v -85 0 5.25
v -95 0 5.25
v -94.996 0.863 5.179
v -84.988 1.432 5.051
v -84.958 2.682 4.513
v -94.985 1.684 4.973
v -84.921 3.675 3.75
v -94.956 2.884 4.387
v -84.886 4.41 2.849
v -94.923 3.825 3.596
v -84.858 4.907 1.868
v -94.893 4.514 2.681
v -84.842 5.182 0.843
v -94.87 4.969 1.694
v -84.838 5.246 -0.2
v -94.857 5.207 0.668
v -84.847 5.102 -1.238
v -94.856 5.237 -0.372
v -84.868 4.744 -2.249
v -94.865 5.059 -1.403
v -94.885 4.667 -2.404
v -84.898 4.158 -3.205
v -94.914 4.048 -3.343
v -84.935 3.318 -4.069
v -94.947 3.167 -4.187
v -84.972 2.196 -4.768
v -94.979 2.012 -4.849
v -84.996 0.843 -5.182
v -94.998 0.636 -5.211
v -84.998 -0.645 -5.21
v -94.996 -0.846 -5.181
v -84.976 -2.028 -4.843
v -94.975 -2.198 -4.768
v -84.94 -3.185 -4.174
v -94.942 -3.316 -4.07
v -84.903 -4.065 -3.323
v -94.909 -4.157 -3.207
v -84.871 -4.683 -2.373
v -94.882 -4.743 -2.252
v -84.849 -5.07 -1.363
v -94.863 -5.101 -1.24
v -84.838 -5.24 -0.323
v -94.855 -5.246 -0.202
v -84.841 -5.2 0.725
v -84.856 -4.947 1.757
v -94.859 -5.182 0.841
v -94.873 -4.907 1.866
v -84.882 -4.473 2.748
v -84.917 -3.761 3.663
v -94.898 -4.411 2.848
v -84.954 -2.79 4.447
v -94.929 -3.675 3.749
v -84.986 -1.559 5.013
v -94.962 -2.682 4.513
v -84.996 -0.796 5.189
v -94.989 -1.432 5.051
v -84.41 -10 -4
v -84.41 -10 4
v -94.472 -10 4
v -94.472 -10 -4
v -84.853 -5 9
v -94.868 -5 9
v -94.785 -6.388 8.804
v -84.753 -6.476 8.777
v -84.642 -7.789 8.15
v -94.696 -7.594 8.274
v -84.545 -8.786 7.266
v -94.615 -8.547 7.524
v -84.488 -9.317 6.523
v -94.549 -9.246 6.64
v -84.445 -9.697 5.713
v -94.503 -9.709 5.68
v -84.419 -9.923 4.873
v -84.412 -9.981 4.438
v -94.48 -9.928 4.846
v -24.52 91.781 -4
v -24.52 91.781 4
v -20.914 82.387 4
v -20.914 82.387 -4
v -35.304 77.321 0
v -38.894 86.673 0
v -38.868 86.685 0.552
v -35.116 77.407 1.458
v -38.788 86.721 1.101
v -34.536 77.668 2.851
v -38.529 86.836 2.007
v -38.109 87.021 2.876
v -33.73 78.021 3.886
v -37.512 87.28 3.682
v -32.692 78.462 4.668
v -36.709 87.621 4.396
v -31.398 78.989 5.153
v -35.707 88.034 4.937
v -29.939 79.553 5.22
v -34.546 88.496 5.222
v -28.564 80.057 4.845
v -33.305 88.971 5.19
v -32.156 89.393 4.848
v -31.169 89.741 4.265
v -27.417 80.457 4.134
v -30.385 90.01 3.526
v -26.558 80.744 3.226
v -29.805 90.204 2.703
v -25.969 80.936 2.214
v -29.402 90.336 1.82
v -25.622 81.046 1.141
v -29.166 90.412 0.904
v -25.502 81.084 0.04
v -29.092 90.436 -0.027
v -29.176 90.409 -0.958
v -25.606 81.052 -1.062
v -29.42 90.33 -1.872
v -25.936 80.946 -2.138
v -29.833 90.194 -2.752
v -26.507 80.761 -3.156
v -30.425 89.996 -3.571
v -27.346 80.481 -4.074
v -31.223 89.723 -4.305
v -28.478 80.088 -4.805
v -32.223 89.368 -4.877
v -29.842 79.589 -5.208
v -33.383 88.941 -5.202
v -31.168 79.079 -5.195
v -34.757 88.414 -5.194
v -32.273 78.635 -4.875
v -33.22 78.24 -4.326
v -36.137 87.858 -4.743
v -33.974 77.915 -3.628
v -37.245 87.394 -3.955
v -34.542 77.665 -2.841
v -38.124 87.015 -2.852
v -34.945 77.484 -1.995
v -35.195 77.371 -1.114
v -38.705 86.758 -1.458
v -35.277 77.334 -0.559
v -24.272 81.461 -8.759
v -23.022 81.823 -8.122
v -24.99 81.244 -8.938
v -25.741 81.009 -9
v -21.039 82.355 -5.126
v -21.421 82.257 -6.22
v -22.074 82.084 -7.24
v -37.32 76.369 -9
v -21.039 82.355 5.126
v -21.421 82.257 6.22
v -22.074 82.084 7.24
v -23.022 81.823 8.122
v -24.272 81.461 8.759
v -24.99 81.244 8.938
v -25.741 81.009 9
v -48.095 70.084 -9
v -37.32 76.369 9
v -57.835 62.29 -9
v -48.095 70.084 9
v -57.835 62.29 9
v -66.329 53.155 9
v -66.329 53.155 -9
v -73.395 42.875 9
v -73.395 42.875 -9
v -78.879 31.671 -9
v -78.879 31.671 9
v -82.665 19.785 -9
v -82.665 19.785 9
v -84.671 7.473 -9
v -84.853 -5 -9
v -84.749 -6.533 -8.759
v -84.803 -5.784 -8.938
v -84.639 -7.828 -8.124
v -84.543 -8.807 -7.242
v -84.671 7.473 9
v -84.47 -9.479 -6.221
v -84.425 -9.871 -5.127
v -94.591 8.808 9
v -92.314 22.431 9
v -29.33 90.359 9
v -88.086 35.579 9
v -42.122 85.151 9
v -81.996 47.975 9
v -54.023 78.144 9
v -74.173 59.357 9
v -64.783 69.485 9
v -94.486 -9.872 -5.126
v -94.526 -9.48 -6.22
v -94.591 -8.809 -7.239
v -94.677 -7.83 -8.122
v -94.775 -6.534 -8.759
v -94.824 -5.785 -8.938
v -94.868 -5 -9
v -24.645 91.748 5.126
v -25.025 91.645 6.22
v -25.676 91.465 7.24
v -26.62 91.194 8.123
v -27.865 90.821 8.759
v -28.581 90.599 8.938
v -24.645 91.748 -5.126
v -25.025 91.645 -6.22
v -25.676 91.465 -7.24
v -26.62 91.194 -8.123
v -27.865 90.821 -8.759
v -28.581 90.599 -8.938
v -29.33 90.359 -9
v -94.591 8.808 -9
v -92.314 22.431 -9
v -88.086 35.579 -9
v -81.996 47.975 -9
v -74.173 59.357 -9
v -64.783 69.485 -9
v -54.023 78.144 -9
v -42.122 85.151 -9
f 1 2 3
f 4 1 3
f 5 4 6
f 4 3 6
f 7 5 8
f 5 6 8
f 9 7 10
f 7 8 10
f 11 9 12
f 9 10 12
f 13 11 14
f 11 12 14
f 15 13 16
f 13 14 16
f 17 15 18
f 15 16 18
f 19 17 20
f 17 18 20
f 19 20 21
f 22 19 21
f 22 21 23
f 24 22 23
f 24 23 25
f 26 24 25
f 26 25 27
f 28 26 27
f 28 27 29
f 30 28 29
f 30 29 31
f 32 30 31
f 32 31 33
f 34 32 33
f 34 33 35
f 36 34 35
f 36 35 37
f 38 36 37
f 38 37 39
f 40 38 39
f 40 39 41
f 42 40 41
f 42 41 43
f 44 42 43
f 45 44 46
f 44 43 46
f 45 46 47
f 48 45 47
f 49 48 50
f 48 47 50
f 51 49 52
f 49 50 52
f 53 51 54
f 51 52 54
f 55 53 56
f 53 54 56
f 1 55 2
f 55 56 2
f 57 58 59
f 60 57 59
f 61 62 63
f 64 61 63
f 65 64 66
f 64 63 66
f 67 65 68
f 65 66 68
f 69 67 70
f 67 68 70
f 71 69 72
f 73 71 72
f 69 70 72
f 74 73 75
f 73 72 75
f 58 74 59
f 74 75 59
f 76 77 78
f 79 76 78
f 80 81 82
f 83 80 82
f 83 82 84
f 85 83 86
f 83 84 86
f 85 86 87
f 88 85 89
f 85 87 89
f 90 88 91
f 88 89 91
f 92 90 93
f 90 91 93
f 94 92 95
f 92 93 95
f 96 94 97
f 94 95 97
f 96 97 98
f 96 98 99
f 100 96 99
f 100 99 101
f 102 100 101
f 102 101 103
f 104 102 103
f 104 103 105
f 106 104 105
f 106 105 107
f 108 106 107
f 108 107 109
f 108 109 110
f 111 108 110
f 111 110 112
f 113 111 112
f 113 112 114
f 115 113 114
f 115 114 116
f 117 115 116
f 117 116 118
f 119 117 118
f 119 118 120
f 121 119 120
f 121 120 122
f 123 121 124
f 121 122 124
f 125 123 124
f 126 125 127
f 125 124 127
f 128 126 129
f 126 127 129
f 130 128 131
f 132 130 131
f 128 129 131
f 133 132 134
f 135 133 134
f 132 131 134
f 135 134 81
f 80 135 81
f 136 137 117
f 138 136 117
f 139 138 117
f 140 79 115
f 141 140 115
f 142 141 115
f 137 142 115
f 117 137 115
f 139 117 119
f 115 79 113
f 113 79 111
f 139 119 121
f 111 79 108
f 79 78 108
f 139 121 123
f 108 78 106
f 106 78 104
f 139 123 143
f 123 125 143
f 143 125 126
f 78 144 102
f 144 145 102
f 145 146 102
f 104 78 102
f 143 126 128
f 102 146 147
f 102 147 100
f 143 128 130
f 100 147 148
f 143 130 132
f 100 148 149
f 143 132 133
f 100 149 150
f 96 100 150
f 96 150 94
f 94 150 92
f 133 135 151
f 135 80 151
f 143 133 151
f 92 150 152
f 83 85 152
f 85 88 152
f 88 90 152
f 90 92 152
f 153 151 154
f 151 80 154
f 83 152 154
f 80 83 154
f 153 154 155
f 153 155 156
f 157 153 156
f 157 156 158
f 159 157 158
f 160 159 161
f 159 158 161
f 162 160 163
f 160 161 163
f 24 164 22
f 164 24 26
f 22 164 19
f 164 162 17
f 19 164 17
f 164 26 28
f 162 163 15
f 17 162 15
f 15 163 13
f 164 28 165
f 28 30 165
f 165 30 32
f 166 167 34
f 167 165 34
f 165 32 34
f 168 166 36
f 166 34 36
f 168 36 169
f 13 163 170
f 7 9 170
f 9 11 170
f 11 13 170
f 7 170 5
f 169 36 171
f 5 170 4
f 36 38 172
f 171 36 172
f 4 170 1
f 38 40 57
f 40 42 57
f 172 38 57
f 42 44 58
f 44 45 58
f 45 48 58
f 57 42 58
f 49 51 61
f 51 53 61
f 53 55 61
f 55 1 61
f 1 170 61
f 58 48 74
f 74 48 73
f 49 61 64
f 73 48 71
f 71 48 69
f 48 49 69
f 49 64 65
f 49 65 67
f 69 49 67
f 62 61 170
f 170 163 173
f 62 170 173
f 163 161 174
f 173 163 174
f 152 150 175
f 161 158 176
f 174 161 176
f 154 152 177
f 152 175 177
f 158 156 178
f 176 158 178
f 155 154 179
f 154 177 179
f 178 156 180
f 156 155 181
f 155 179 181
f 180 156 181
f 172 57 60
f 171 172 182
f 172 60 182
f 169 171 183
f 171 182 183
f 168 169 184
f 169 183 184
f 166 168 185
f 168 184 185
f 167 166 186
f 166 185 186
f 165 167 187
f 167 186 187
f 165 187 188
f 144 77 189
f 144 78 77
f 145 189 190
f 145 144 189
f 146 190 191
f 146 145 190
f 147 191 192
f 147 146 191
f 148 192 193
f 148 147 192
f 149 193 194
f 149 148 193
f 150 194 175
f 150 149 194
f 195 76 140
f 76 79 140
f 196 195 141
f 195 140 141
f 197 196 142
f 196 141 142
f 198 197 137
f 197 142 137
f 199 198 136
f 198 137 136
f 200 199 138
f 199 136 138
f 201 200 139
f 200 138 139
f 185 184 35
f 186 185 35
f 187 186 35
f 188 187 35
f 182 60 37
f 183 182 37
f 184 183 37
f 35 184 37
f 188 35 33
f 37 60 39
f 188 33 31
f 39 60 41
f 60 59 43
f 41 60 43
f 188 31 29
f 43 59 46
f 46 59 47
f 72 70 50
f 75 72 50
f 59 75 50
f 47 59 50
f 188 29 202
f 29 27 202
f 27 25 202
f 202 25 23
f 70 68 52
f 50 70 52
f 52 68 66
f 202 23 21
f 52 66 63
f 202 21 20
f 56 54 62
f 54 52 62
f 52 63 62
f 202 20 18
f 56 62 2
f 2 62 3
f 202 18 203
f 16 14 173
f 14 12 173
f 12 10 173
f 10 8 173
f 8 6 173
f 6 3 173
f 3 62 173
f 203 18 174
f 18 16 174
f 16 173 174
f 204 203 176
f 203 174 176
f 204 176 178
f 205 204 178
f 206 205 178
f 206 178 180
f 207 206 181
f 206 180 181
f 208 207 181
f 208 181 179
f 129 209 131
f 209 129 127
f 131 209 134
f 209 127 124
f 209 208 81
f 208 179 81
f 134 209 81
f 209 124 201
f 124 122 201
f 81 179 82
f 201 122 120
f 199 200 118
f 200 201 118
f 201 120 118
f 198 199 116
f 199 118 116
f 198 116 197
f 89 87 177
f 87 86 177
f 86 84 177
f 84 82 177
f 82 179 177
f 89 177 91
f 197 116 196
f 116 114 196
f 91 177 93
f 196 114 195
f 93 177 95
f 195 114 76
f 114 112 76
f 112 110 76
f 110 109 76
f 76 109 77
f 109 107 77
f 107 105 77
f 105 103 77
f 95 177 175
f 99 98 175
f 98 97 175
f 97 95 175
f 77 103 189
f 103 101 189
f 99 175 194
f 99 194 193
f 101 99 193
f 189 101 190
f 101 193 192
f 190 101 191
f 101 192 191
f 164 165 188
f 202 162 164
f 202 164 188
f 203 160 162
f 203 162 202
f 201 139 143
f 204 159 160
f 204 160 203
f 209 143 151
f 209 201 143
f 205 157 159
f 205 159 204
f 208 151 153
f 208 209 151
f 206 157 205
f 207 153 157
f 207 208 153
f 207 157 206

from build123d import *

# Parameters (mm, degrees)
BOSS_EXTRUDE3_DEPTH = 9
SKETCH5_R           = 5.25
CUT_EXTRUDE4_DEPTH  = 18
SKETCH6_R           = 5.25
CUT_EXTRUDE5_DEPTH  = 18
FILLET1_R           = 5


with BuildPart() as part:
    # Sketch1 → Boss-Extrude3 (new, symmetric)
    with BuildSketch(Plane.XY):
        with BuildLine():
            Line((-24.520010838, 91.781093197), (-20.91393225, 82.386937301))
            ThreePointArc((-20.91393225, 82.386937301), (-70.050726033, 48.144530139), (-84.409715081, -10))
            Line((-84.409715081, -10), (-94.472218138, -10))
            ThreePointArc((-94.472218138, -10), (-78.291987919, 53.808592508), (-24.520010838, 91.781093197))
        make_face()
    extrude(amount=BOSS_EXTRUDE3_DEPTH, both=True)

    # Sketch5 → Cut-Extrude4 (cut)
    with BuildSketch(Plane(origin=(-34.044955207, 88.690140517, 0), x_dir=(0.9335804264972001, 0.35836794954530493, 0), z_dir=(-0.35836794954530493, 0.9335804264972001, 0))):
        with Locations(Location((0, 0, 0), (0, 0, 180))):
            Circle(SKETCH5_R)
    extrude(amount=-CUT_EXTRUDE4_DEPTH, mode=Mode.SUBTRACT)

    # Sketch6 → Cut-Extrude5 (cut)
    with BuildSketch(Plane.ZY.offset(95)):
        Circle(SKETCH6_R)
    extrude(amount=-CUT_EXTRUDE5_DEPTH, mode=Mode.SUBTRACT)

    # Fillet1
    fillet1_edges = [part.edges().sort_by_distance(p)[0] for p in [
        (-89.44096661, -10, 9),
        (-89.44096661, -10, -9),
        (-22.716971544, 87.084015249, -9),
        (-22.716971544, 87.084015249, 9),
    ]]
    fillet(fillet1_edges, radius=FILLET1_R)


solid = part.part
